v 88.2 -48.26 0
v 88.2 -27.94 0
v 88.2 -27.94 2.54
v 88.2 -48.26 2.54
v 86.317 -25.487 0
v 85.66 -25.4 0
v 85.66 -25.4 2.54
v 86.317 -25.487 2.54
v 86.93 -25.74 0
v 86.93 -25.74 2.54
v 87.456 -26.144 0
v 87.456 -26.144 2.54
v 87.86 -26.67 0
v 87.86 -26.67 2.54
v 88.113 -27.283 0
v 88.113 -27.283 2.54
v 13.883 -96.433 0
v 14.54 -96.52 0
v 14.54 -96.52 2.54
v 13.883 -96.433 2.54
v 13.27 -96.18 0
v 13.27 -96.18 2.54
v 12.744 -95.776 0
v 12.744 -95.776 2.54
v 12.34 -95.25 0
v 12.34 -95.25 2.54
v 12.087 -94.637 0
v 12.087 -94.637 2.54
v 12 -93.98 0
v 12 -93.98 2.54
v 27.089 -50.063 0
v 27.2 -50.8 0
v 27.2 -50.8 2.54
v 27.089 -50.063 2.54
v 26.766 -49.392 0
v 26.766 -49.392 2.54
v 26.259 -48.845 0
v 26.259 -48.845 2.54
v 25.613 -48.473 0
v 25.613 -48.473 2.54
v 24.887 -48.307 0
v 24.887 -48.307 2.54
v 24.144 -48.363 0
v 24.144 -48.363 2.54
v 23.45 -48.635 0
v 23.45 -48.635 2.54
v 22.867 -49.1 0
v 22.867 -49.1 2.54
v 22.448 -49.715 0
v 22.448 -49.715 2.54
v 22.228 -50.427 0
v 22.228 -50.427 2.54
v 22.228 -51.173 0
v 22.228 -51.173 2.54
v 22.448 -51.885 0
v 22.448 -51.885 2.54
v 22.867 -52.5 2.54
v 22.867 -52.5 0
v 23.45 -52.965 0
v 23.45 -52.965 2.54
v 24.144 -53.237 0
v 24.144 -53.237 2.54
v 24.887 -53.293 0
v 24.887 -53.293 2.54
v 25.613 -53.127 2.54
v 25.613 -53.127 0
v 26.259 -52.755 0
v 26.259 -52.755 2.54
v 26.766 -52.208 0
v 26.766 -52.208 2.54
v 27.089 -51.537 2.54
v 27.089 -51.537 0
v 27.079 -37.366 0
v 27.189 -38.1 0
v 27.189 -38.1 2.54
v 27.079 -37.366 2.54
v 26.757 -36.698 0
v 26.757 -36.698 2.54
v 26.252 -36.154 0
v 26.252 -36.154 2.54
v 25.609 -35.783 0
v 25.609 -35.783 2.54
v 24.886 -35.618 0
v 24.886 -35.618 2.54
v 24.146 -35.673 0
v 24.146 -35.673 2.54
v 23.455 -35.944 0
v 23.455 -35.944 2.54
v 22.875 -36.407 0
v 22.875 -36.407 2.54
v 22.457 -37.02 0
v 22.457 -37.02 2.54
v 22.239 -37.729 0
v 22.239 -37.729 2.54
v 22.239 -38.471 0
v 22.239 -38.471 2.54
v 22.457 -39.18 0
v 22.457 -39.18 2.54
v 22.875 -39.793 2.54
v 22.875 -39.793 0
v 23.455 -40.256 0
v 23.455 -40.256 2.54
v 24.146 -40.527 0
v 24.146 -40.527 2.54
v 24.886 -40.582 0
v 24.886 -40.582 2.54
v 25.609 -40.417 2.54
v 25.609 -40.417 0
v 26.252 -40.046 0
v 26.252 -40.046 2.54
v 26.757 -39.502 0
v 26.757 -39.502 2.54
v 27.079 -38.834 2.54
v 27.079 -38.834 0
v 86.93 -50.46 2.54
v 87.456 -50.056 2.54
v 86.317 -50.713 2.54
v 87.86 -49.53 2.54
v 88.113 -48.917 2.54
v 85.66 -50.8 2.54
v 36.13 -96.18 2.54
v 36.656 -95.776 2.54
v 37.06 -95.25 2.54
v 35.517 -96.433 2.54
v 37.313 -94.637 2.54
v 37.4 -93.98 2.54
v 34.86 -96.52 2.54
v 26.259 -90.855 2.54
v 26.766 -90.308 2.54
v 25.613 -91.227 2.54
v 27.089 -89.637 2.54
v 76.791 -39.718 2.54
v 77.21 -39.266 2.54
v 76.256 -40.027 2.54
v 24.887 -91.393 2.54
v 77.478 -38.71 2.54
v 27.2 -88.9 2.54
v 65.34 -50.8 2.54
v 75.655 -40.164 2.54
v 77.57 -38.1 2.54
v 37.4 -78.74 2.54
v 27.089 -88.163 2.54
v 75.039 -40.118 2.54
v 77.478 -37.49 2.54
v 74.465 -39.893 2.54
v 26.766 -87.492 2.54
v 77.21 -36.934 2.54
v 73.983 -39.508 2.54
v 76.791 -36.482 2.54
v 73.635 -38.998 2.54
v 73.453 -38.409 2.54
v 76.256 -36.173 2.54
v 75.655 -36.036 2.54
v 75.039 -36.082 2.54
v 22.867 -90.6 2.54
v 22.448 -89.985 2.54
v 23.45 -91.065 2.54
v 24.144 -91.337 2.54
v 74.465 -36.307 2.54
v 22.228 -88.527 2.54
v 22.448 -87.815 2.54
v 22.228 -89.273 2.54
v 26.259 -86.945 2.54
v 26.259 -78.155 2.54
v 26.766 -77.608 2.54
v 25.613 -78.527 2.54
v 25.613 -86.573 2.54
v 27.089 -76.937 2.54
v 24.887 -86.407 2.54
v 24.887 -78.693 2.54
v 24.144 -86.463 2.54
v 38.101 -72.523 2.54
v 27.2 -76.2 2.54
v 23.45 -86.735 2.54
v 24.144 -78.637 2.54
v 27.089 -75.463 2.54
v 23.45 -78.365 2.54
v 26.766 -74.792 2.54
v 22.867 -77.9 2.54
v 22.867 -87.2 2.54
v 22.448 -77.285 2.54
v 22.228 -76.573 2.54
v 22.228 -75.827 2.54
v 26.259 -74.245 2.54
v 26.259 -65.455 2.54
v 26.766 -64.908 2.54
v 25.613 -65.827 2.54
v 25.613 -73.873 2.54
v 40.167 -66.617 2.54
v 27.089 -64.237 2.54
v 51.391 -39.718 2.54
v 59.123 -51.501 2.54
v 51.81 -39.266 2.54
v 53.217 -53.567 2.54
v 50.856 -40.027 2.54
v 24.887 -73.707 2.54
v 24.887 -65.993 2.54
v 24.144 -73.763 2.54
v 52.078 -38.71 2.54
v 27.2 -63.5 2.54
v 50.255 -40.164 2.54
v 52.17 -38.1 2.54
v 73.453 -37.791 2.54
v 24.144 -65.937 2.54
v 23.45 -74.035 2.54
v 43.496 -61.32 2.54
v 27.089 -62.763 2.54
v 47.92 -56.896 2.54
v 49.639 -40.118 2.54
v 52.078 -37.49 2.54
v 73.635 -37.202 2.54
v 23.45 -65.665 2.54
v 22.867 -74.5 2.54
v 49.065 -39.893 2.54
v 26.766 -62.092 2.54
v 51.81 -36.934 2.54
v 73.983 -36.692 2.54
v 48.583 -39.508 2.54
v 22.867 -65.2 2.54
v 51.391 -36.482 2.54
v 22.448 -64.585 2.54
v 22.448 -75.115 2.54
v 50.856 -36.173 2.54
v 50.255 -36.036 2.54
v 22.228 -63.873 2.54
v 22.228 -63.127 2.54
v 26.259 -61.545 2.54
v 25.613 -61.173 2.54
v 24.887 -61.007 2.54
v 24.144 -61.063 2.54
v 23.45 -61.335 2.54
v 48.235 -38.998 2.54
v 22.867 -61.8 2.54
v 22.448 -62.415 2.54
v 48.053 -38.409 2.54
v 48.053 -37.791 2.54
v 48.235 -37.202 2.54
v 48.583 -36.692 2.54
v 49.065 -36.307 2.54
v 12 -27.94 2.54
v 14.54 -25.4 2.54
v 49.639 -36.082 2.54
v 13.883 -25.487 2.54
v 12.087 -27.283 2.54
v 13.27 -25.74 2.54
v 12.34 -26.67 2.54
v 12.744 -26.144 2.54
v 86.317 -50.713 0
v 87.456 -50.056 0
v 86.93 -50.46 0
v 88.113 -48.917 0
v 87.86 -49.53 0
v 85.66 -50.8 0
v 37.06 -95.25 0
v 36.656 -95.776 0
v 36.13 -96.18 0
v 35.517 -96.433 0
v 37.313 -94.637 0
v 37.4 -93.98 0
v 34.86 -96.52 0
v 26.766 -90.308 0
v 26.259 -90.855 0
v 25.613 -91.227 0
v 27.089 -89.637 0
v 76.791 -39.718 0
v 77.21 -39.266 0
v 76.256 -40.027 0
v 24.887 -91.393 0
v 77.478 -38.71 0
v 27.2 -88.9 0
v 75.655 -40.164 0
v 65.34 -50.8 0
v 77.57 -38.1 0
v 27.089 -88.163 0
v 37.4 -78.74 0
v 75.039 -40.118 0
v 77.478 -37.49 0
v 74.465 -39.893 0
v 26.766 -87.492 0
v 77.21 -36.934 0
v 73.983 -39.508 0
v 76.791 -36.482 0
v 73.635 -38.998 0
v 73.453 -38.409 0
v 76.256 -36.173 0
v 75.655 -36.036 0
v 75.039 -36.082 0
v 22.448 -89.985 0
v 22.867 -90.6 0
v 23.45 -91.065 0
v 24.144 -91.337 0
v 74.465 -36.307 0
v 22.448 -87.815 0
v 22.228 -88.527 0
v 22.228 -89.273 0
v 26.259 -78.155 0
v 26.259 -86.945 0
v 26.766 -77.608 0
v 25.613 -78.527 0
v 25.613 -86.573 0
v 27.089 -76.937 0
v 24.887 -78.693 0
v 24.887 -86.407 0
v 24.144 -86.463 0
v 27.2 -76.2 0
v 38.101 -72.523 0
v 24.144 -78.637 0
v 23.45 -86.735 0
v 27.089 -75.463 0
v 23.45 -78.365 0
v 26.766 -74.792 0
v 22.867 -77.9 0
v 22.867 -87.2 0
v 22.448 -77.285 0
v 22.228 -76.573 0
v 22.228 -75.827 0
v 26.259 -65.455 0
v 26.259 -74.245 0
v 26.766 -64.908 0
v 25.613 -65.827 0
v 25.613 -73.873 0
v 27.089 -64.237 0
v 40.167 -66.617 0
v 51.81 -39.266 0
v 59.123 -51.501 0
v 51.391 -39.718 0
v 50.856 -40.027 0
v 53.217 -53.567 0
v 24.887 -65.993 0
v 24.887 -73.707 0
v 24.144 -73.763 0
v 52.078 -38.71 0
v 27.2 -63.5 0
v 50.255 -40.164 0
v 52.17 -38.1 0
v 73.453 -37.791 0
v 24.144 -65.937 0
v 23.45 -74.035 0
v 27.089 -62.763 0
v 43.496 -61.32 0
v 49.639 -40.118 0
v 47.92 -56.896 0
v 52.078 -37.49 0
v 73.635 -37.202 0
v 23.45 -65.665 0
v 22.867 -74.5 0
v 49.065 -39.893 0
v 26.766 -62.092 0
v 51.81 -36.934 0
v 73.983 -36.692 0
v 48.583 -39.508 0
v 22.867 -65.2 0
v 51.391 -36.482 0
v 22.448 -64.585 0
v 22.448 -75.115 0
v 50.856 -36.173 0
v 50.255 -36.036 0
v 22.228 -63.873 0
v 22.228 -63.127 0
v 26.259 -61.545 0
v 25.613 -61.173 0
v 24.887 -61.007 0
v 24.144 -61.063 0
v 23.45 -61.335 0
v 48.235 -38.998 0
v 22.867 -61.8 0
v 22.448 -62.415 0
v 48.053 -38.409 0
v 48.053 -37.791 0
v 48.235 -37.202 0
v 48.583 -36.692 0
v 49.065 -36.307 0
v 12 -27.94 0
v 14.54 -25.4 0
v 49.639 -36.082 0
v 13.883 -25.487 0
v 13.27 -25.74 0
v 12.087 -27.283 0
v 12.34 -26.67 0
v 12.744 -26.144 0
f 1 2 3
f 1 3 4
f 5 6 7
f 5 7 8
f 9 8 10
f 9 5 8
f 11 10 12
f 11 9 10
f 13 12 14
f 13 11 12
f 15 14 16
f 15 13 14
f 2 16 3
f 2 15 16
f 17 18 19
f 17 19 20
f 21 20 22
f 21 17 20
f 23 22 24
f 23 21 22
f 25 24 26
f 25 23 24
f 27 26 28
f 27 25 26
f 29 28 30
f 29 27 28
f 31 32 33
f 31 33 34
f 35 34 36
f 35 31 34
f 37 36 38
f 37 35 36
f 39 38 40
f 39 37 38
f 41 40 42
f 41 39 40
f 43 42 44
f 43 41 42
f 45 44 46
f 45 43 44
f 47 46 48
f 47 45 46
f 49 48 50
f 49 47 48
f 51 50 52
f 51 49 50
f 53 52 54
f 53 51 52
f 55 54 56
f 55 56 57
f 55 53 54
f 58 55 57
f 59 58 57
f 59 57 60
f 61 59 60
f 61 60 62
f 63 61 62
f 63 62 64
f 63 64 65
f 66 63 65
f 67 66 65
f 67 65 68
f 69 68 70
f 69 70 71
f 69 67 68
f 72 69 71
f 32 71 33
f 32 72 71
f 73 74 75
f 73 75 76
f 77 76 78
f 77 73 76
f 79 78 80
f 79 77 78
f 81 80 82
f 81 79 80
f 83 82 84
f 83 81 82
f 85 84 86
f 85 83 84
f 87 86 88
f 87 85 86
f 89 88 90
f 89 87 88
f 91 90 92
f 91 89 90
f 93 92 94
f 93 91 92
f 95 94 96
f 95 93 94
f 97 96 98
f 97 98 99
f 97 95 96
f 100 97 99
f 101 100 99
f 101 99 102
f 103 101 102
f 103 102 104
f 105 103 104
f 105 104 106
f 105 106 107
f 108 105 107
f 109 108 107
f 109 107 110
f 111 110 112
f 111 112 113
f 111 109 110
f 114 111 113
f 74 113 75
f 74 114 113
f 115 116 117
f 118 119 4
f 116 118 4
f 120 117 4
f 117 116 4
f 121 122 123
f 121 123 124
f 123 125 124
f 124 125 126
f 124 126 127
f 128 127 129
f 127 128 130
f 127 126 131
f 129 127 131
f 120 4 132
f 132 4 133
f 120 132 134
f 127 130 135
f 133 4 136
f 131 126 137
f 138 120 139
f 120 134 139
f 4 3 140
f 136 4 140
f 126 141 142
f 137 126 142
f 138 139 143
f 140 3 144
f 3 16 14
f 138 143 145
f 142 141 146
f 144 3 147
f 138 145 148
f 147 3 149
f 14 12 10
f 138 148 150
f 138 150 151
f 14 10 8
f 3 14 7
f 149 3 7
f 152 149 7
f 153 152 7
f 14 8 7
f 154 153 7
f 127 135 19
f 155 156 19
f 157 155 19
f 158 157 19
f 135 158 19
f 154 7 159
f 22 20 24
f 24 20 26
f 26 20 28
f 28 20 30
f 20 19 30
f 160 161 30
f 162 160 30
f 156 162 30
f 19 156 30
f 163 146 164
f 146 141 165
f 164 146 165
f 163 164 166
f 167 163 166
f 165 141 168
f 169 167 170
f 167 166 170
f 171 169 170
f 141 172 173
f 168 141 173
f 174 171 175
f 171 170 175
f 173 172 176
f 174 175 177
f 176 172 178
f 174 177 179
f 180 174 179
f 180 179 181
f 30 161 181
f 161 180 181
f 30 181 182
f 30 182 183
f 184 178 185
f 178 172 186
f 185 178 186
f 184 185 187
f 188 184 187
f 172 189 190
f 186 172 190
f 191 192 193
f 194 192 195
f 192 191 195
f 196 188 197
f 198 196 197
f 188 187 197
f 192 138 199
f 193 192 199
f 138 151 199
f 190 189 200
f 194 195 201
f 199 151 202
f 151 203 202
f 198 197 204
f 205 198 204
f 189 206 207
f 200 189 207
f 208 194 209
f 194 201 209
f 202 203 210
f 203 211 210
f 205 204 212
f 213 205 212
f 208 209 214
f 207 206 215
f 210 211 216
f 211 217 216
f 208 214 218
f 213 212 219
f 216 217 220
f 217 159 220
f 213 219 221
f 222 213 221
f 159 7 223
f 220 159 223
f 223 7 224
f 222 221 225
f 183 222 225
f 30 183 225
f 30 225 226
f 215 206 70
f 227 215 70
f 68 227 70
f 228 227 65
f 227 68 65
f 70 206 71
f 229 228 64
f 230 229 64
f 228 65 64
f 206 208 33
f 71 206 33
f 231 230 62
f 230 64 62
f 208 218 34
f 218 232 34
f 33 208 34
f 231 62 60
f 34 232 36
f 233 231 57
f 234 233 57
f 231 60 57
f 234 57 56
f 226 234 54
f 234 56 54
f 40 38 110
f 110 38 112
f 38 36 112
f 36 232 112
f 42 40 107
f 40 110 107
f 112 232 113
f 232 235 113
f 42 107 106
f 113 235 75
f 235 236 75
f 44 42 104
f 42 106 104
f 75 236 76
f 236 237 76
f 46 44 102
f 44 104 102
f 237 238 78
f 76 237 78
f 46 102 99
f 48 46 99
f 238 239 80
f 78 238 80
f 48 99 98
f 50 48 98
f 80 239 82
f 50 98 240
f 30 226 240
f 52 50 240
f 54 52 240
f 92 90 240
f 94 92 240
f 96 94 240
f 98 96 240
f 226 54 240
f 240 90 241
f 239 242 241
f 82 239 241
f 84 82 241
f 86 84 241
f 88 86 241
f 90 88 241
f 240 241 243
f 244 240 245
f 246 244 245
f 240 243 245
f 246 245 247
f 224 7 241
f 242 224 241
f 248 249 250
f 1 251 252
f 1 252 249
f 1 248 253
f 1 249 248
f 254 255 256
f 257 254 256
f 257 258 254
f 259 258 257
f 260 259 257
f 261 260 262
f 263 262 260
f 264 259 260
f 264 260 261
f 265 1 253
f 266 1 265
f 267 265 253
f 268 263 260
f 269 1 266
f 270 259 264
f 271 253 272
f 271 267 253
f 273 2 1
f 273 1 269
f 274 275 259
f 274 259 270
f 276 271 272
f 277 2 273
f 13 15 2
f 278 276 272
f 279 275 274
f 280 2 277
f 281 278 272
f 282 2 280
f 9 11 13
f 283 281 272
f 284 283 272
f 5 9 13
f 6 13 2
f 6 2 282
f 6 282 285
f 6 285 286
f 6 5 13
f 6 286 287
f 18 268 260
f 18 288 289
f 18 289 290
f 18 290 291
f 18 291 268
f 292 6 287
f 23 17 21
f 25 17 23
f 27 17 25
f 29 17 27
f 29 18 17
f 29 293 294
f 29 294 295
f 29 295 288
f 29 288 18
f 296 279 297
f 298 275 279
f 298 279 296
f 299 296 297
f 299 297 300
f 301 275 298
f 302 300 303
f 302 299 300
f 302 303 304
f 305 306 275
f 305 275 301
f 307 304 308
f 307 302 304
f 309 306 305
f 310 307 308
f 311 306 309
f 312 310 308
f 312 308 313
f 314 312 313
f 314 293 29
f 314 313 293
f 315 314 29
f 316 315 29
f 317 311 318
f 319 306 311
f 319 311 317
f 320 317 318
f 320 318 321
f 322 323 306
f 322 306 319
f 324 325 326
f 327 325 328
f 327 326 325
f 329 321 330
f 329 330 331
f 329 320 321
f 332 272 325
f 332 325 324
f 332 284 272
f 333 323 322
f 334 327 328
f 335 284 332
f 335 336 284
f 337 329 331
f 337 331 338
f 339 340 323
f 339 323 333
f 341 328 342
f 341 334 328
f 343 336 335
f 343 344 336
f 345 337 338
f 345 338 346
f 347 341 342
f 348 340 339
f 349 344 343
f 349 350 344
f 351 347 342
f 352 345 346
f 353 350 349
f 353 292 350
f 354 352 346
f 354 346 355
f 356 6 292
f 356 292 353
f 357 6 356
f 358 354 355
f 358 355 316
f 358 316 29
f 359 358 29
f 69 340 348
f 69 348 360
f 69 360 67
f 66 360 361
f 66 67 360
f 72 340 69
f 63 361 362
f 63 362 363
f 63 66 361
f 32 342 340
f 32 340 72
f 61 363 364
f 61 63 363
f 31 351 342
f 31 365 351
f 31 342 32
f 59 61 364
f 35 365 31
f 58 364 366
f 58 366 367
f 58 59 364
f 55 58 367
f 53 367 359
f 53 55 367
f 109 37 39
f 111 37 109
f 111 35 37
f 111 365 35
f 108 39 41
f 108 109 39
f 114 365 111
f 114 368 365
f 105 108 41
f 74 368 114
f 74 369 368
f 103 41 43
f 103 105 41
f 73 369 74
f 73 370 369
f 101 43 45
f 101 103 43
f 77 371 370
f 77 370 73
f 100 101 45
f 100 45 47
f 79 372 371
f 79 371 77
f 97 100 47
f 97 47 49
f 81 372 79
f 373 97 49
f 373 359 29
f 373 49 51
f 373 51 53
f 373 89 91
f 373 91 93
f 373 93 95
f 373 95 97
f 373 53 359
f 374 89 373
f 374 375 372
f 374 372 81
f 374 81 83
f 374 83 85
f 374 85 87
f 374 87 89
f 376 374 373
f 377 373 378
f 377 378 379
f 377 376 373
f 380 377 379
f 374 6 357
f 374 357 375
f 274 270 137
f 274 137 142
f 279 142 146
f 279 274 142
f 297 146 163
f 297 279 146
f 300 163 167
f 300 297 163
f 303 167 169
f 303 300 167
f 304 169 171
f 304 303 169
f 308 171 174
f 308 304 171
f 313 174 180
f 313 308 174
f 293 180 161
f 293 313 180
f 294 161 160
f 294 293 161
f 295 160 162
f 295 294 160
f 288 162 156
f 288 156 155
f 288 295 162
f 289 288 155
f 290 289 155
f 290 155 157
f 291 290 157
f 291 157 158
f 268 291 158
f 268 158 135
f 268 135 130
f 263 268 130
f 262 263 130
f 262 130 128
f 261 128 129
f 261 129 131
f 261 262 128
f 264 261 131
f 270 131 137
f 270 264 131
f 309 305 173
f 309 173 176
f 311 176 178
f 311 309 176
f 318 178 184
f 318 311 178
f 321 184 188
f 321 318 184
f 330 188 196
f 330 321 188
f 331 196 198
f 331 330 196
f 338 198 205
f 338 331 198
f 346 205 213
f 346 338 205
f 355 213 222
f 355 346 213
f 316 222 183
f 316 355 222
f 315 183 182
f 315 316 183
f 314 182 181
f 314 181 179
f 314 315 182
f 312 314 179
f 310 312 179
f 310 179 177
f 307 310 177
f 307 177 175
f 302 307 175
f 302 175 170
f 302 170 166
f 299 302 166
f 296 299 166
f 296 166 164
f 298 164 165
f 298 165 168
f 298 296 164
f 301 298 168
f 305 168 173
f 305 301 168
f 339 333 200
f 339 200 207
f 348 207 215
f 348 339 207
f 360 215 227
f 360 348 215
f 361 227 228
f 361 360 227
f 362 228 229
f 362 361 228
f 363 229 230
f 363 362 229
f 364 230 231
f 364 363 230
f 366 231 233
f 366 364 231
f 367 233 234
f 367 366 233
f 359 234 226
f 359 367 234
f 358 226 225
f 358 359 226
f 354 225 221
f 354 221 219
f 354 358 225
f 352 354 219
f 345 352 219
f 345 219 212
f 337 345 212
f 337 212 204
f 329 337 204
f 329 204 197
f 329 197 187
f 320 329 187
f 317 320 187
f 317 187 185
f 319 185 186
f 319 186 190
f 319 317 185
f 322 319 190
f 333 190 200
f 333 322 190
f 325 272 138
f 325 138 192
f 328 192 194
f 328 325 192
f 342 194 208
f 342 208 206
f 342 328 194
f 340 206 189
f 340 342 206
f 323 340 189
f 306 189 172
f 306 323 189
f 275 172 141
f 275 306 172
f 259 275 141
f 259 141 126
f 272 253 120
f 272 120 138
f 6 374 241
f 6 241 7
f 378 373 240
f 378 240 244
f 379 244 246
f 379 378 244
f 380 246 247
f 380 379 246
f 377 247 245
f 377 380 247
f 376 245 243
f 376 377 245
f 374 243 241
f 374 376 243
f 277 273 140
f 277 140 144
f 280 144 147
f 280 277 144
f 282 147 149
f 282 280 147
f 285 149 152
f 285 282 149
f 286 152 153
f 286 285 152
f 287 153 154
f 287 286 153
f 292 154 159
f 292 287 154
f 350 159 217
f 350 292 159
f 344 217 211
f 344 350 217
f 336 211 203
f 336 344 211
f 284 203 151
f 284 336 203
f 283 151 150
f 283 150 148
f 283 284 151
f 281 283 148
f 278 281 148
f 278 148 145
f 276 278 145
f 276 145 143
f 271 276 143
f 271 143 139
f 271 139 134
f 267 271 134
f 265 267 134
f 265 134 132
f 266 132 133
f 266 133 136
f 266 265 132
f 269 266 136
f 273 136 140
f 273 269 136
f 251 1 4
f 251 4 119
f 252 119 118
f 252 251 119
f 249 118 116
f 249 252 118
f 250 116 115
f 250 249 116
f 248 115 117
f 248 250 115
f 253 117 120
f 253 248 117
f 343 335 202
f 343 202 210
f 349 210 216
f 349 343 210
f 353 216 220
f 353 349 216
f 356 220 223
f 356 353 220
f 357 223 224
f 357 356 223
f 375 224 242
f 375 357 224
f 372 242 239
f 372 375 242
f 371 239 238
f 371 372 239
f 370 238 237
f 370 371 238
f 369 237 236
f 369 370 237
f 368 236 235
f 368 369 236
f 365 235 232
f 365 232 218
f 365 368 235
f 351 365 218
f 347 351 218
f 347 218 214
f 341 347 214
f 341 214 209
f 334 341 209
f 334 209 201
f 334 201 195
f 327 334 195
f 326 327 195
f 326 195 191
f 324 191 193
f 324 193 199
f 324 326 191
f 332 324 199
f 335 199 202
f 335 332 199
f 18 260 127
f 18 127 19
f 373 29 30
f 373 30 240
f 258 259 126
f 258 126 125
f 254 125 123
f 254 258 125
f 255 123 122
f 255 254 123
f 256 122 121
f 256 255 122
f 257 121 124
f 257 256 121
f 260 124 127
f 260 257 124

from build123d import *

# Parameters (mm, degrees)
SKETCH1_R           = 2.5
SKETCH1_R_2         = 2.4892
SKETCH1_R_3         = 2.0701
BOSS_EXTRUDE1_DEPTH = 2.54


with BuildPart() as part:
    # Sketch1 → Boss-Extrude1 (new body)
    with BuildSketch(Plane.XY):
        with BuildLine():
            Line((85.66, -50.8), (65.34, -50.8))
            ThreePointArc((65.34, -50.8), (45.583436534, -58.983436534), (37.4, -78.74))
            Line((37.4, -78.74), (37.4, -93.98))
            ThreePointArc((37.4, -93.98), (36.656051224, -95.776051224), (34.86, -96.52))
            Line((34.86, -96.52), (14.54, -96.52))
            ThreePointArc((14.54, -96.52), (12.743948776, -95.776051224), (12, -93.98))
            Line((12, -93.98), (12, -50.8))
            Line((12, -50.8), (12, -27.94))
            ThreePointArc((12, -27.94), (12.743948776, -26.143948776), (14.54, -25.4))
            Line((14.54, -25.4), (85.66, -25.4))
            ThreePointArc((85.66, -25.4), (87.456051224, -26.143948776), (88.2, -27.94))
            Line((88.2, -27.94), (88.2, -48.26))
            ThreePointArc((88.2, -48.26), (87.456051224, -50.056051224), (85.66, -50.8))
        make_face()
        with Locations((24.7, -88.9)):
            Circle(SKETCH1_R, mode=Mode.SUBTRACT)
        with Locations((24.7, -76.2)):
            Circle(SKETCH1_R, mode=Mode.SUBTRACT)
        with Locations((24.7, -63.5)):
            Circle(SKETCH1_R, mode=Mode.SUBTRACT)
        with Locations((24.7, -50.8)):
            Circle(SKETCH1_R, mode=Mode.SUBTRACT)
        with Locations((24.7, -38.1)):
            Circle(SKETCH1_R_2, mode=Mode.SUBTRACT)
        with Locations((50.1, -38.1)):
            Circle(SKETCH1_R_3, mode=Mode.SUBTRACT)
        with Locations((75.5, -38.1)):
            Circle(SKETCH1_R_3, mode=Mode.SUBTRACT)
    extrude(amount=BOSS_EXTRUDE1_DEPTH)


solid = part.part
